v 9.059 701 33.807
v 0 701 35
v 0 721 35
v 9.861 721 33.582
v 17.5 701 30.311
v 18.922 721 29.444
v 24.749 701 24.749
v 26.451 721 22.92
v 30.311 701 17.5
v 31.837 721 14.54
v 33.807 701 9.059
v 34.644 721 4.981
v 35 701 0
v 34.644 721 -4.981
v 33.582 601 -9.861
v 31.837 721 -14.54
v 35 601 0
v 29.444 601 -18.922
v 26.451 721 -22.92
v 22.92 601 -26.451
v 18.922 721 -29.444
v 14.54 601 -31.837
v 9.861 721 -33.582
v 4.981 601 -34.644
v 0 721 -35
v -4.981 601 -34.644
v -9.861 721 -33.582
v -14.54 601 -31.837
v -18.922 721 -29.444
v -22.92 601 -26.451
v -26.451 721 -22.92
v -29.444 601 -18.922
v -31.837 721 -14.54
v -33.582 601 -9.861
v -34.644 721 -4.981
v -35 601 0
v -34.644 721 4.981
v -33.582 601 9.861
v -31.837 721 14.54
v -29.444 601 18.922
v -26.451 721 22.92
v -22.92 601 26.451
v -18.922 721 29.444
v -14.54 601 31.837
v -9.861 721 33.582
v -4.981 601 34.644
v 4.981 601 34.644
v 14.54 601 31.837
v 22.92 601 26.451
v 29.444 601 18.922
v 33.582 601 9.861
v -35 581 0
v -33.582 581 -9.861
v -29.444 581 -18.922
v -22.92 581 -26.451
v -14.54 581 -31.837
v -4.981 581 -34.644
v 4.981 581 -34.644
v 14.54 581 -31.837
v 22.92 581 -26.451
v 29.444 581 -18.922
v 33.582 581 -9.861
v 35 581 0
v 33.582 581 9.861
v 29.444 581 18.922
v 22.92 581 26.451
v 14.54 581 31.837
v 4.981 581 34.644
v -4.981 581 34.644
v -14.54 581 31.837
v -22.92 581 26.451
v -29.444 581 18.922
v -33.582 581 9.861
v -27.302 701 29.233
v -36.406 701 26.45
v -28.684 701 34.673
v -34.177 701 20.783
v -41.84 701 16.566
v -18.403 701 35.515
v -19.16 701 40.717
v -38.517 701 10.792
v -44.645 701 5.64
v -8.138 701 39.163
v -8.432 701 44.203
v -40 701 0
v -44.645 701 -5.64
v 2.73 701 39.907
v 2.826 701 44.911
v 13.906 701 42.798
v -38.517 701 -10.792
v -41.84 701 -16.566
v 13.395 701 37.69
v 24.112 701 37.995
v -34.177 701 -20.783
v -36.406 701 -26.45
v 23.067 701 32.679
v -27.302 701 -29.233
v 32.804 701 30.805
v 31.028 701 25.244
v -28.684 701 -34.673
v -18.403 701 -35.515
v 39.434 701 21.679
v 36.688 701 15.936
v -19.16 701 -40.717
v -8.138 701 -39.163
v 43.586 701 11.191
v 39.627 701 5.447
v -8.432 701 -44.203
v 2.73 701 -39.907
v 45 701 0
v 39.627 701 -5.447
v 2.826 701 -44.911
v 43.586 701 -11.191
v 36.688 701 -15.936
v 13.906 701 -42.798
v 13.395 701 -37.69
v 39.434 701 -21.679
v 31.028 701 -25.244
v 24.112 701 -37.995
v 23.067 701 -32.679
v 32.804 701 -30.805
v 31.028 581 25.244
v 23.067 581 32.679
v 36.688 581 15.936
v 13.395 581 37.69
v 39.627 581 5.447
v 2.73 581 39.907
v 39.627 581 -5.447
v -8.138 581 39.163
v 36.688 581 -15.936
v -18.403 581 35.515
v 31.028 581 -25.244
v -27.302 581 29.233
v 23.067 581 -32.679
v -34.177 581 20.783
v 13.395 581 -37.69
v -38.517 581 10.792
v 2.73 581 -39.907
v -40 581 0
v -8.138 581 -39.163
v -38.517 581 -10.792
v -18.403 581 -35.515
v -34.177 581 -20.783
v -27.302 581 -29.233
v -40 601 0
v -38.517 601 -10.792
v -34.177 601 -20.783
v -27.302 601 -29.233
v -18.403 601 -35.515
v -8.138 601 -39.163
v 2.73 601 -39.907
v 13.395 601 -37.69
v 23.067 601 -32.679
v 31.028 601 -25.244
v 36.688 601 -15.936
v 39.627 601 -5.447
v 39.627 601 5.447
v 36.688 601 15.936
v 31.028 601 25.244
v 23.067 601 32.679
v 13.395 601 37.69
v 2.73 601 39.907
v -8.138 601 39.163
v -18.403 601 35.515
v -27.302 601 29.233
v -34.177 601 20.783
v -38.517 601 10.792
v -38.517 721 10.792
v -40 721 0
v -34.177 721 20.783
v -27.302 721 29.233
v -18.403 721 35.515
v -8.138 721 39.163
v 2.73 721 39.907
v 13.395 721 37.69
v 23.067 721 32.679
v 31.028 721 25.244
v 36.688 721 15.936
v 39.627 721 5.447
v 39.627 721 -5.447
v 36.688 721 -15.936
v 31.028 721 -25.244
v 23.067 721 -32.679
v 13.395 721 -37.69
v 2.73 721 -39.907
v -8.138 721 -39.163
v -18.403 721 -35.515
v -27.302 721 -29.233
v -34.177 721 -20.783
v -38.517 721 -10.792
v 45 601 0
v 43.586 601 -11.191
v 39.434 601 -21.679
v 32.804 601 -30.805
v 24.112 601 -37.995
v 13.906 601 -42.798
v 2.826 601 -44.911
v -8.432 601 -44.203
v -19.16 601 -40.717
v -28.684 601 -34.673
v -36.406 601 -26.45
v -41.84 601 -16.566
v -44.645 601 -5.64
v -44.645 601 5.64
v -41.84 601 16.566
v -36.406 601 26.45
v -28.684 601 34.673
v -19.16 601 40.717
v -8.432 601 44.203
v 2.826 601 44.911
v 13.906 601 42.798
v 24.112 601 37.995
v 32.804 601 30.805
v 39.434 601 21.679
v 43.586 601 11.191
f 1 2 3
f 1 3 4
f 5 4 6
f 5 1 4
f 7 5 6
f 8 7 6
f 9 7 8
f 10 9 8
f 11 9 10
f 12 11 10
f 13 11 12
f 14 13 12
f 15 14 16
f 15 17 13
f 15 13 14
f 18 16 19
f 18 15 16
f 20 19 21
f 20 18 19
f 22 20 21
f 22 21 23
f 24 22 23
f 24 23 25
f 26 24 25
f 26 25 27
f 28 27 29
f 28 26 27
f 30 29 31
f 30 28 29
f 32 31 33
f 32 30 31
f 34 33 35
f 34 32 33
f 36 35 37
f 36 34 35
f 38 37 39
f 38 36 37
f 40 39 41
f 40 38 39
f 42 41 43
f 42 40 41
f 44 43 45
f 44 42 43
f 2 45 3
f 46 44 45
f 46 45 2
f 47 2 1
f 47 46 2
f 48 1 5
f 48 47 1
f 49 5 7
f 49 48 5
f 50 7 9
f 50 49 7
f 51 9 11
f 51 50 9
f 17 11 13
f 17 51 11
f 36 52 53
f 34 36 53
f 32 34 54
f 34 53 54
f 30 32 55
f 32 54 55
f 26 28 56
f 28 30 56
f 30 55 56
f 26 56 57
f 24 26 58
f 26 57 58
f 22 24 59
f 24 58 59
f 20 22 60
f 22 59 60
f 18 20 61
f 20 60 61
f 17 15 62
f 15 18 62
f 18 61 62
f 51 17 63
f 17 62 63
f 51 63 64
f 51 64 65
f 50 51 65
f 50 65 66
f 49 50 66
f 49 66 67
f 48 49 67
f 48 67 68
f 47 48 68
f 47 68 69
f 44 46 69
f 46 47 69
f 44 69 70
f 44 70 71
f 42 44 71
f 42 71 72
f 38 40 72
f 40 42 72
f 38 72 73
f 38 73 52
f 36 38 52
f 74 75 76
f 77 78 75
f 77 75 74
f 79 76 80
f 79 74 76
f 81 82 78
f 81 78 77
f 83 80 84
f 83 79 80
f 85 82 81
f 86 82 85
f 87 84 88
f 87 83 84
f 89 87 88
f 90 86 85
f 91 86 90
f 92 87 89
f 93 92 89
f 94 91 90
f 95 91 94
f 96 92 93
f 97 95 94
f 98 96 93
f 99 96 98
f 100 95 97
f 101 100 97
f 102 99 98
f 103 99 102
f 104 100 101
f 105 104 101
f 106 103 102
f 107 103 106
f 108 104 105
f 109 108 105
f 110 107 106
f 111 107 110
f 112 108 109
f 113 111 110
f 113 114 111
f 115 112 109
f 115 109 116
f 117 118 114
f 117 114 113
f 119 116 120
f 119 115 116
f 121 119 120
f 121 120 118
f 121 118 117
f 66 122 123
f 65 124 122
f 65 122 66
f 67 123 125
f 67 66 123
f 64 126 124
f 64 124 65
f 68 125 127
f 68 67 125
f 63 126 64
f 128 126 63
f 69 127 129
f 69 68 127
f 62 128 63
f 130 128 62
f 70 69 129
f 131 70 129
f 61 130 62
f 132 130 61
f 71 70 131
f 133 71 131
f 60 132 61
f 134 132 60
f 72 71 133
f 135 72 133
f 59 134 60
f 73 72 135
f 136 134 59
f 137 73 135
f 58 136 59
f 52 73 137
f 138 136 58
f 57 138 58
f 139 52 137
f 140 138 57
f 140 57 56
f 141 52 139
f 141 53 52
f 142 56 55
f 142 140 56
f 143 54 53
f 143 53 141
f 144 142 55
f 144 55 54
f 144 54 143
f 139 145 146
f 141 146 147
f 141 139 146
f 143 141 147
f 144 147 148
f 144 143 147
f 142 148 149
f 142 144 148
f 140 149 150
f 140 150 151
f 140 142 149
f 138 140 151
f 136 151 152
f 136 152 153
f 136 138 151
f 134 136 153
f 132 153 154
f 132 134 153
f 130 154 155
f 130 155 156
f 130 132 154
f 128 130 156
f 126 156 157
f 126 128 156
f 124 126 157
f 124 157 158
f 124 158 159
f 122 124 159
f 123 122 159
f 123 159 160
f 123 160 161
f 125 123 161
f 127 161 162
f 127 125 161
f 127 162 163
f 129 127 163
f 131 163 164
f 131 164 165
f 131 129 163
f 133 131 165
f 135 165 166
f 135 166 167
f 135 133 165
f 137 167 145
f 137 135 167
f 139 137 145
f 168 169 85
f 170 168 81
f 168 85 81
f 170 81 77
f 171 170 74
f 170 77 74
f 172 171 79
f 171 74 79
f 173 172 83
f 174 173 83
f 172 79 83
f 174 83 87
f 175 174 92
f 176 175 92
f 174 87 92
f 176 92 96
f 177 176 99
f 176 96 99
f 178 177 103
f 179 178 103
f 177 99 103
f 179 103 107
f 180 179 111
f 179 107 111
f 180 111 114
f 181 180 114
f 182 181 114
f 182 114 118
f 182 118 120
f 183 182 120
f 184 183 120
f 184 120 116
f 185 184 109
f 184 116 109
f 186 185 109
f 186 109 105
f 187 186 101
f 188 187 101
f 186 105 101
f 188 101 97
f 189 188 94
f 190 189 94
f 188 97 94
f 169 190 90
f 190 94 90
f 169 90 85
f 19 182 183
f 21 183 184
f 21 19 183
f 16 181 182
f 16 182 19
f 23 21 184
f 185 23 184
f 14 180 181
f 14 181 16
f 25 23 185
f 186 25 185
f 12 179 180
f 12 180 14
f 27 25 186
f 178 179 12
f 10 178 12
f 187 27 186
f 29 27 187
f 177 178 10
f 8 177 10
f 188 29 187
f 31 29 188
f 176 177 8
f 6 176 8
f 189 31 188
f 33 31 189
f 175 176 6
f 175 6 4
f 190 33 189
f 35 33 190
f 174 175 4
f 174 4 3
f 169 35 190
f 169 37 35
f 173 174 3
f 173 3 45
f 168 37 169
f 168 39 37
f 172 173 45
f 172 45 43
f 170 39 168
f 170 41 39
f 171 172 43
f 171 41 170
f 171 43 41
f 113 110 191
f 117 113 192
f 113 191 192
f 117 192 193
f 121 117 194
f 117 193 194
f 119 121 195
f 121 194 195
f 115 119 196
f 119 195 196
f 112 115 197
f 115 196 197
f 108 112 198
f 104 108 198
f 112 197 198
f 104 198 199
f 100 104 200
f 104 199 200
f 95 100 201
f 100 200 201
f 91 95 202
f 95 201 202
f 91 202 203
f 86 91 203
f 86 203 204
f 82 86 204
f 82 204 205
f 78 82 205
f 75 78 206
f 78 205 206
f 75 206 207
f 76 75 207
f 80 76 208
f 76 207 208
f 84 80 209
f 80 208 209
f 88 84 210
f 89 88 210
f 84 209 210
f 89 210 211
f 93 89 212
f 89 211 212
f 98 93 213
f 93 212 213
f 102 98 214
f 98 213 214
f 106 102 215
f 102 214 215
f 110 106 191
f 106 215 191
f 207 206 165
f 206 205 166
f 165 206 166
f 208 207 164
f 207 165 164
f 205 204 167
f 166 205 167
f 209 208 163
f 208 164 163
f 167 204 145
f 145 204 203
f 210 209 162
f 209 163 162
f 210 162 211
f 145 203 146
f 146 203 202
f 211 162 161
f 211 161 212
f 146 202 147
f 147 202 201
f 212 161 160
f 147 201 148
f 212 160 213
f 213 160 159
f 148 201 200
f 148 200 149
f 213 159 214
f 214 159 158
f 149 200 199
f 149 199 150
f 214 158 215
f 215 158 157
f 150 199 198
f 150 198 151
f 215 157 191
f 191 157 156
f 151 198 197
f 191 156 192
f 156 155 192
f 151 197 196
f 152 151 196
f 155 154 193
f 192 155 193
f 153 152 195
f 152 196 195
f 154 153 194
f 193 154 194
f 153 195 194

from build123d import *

# Parameters (mm, degrees)
F_3DSKETCH4_R       = 45
F_3DSKETCH4_R_2     = 35
BOSS_EXTRUDE3_DEPTH = 100
SKETCH3_R           = 40
SKETCH3_R_2         = 35
BOSS_EXTRUDE4_DEPTH = 20
BOSS_EXTRUDE5_START = 20
SKETCH4_R           = 40
SKETCH4_R_2         = 35
BOSS_EXTRUDE5_DEPTH = 20


with BuildPart() as part:
    # 3DSketch4 → Boss-Extrude3 (new body)
    with BuildSketch(Plane.ZX.offset(601)):
        Circle(F_3DSKETCH4_R)
        Circle(F_3DSKETCH4_R_2, mode=Mode.SUBTRACT)
    extrude(amount=BOSS_EXTRUDE3_DEPTH)

    # Sketch3 → Boss-Extrude4 (add)
    with BuildSketch(Plane(origin=(0, 701, 0), x_dir=(1, 0, 0), z_dir=(0, 1, 0))):
        Circle(SKETCH3_R)
        Circle(SKETCH3_R_2, mode=Mode.SUBTRACT)
    extrude(amount=BOSS_EXTRUDE4_DEPTH)

    # Sketch4 → Boss-Extrude5 (add)
    with BuildSketch(Plane.XZ.offset(-601).offset(BOSS_EXTRUDE5_START)):
        Circle(SKETCH4_R)
        Circle(SKETCH4_R_2, mode=Mode.SUBTRACT)
    extrude(amount=-BOSS_EXTRUDE5_DEPTH)


solid = part.part
